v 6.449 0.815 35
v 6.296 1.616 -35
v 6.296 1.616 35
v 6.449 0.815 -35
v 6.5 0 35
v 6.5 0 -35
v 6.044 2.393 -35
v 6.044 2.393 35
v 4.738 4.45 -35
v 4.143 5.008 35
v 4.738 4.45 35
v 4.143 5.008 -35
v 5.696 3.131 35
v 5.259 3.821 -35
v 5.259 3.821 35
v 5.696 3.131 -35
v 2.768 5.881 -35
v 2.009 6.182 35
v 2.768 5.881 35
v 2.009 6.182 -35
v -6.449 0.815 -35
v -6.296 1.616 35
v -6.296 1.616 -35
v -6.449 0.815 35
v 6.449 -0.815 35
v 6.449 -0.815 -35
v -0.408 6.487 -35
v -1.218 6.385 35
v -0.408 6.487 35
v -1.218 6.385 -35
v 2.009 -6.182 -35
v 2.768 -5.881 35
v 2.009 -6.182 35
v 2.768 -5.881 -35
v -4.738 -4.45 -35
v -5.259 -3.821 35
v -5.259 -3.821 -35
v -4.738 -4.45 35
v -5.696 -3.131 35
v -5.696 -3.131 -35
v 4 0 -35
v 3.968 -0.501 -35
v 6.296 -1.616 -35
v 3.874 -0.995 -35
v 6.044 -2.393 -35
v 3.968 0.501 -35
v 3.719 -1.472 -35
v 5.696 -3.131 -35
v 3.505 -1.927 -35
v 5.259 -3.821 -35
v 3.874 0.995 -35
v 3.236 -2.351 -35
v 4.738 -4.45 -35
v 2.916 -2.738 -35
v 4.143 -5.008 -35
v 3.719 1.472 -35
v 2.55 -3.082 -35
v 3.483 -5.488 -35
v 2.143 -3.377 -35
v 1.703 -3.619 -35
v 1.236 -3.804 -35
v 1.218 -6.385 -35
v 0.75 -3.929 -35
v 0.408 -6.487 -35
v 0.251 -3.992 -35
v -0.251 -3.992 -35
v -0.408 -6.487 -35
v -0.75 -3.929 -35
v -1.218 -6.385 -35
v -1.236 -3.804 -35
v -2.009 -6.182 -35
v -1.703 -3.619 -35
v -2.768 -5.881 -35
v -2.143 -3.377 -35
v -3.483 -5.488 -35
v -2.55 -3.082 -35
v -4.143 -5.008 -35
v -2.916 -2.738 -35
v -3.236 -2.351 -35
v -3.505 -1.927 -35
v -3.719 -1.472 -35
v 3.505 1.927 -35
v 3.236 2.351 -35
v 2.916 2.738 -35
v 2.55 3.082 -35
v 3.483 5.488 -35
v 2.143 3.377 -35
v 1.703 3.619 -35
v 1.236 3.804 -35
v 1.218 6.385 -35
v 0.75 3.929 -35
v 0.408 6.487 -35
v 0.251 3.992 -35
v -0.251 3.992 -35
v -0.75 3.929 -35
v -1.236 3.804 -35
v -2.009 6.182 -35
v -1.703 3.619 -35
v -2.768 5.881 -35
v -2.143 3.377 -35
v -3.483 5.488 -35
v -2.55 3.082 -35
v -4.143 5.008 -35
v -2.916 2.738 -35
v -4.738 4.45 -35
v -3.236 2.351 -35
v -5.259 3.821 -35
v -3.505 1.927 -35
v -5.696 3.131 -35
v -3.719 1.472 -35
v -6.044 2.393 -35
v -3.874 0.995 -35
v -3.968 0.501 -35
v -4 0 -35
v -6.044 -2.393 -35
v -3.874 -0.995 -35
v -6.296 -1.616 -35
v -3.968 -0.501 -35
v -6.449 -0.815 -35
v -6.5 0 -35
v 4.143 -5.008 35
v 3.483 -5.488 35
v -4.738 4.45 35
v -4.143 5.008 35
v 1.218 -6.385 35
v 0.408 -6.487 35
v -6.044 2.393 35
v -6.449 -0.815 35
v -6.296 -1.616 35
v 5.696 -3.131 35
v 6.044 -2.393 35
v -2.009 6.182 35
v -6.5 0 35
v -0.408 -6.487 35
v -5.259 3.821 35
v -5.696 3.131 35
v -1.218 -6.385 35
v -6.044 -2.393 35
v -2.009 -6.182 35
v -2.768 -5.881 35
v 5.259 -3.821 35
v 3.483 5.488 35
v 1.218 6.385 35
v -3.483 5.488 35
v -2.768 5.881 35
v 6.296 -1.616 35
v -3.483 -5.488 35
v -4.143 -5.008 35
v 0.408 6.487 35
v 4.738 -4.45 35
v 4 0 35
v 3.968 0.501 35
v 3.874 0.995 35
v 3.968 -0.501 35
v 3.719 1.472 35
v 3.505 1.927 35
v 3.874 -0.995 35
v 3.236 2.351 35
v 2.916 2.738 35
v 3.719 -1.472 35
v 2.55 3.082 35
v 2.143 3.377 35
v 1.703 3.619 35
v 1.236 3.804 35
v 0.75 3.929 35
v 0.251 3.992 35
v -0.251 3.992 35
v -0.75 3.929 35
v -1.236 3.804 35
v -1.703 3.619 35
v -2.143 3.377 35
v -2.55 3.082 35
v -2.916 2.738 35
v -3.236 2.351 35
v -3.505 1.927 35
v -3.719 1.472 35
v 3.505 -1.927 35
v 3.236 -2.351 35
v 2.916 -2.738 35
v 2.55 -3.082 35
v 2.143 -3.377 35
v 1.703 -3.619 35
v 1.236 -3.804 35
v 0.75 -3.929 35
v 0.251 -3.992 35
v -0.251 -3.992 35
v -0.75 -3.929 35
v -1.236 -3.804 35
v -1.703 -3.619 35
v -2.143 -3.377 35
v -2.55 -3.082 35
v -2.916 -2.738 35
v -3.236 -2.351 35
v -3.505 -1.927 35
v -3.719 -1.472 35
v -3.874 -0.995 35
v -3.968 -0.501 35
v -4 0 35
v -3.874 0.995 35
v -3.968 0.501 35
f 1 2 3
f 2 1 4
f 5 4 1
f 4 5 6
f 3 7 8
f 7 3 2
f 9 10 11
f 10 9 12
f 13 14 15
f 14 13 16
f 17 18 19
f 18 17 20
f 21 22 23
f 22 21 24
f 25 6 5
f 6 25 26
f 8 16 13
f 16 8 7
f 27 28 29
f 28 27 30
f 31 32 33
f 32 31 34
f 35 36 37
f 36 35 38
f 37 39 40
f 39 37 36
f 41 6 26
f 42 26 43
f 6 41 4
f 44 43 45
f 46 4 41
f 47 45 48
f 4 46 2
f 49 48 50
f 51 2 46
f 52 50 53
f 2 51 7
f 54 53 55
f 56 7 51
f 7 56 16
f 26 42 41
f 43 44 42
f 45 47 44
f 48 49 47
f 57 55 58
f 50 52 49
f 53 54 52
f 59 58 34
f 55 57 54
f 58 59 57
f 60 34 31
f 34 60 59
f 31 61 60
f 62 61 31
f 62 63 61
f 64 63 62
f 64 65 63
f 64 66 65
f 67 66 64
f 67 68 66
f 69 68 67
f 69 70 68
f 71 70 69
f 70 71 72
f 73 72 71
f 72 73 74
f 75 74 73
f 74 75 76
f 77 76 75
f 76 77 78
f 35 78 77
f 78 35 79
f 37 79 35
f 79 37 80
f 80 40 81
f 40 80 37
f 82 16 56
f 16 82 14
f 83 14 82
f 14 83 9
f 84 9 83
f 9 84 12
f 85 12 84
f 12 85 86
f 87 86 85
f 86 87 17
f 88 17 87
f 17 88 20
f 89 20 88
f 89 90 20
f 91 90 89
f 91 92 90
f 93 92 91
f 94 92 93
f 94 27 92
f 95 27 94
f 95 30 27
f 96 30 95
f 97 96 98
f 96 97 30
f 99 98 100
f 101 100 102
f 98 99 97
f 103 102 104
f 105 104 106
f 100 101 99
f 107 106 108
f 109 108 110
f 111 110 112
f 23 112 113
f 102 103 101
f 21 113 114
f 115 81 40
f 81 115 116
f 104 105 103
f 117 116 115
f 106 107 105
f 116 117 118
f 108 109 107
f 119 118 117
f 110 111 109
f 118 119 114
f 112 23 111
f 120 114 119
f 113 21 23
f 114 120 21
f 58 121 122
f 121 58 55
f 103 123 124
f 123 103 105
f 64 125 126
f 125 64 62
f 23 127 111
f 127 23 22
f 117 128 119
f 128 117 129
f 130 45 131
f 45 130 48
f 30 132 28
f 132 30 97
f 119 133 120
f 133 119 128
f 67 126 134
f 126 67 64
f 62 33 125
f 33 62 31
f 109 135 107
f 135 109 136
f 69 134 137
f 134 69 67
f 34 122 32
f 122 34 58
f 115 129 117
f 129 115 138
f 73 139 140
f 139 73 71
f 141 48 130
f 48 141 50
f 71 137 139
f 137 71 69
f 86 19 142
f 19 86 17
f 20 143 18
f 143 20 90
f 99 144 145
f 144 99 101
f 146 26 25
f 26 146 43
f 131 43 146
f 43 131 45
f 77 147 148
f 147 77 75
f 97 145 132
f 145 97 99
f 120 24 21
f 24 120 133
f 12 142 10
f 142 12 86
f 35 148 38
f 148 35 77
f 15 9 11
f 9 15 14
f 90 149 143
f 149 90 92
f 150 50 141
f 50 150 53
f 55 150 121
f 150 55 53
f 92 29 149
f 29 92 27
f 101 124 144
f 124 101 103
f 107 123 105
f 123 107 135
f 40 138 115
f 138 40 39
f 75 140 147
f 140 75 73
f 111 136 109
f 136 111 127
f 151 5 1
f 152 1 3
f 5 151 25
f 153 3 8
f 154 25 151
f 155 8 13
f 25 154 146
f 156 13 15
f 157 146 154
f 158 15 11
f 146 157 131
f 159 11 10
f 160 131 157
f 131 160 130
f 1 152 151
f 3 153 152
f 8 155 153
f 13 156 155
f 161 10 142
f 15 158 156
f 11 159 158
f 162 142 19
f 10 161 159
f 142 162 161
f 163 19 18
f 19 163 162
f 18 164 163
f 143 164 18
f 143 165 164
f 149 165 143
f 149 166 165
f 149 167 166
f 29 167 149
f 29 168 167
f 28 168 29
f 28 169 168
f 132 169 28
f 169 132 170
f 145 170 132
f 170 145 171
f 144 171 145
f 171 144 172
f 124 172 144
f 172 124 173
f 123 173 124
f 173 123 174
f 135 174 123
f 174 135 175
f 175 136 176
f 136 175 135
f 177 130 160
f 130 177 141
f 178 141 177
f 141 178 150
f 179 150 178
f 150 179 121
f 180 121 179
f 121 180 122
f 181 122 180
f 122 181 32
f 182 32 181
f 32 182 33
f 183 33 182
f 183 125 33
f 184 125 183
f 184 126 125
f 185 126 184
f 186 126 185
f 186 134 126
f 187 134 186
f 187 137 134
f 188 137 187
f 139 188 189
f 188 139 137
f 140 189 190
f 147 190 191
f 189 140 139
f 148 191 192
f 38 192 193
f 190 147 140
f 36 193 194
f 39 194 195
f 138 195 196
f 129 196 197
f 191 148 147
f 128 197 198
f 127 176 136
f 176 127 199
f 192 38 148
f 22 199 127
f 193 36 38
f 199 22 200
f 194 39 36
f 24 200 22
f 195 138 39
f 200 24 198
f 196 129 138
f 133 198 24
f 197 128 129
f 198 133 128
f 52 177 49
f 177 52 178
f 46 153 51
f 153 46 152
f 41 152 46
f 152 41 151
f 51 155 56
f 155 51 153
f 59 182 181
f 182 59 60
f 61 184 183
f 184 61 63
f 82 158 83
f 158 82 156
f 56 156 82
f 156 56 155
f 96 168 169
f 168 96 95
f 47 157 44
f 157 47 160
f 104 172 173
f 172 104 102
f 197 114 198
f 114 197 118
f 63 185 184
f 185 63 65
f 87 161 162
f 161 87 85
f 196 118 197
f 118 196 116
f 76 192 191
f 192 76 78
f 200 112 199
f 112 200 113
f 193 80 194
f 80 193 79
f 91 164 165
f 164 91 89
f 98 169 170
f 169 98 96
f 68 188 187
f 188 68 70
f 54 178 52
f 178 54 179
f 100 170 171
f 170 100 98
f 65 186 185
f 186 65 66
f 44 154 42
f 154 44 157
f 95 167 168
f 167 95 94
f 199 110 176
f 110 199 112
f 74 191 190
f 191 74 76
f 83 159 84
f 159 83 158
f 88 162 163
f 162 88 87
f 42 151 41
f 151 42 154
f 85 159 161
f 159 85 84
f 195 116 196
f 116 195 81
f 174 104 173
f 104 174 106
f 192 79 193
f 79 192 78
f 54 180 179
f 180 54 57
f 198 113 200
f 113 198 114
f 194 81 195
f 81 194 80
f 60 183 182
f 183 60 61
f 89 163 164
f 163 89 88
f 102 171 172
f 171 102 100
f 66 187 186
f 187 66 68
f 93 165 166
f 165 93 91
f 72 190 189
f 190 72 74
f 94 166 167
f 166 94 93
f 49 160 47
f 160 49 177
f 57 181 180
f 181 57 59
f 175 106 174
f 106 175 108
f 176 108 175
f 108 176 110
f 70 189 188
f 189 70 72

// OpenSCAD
$fn = 50;


difference() {
	union() {
		translate(v = [0, 0, -35.0000000000]) {
			cylinder(h = 70, r = 6.5000000000);
		}
	}
	union() {
		translate(v = [0, 0, -100.0000000000]) {
			cylinder(h = 200, r = 4.0000000000);
		}
	}
}
